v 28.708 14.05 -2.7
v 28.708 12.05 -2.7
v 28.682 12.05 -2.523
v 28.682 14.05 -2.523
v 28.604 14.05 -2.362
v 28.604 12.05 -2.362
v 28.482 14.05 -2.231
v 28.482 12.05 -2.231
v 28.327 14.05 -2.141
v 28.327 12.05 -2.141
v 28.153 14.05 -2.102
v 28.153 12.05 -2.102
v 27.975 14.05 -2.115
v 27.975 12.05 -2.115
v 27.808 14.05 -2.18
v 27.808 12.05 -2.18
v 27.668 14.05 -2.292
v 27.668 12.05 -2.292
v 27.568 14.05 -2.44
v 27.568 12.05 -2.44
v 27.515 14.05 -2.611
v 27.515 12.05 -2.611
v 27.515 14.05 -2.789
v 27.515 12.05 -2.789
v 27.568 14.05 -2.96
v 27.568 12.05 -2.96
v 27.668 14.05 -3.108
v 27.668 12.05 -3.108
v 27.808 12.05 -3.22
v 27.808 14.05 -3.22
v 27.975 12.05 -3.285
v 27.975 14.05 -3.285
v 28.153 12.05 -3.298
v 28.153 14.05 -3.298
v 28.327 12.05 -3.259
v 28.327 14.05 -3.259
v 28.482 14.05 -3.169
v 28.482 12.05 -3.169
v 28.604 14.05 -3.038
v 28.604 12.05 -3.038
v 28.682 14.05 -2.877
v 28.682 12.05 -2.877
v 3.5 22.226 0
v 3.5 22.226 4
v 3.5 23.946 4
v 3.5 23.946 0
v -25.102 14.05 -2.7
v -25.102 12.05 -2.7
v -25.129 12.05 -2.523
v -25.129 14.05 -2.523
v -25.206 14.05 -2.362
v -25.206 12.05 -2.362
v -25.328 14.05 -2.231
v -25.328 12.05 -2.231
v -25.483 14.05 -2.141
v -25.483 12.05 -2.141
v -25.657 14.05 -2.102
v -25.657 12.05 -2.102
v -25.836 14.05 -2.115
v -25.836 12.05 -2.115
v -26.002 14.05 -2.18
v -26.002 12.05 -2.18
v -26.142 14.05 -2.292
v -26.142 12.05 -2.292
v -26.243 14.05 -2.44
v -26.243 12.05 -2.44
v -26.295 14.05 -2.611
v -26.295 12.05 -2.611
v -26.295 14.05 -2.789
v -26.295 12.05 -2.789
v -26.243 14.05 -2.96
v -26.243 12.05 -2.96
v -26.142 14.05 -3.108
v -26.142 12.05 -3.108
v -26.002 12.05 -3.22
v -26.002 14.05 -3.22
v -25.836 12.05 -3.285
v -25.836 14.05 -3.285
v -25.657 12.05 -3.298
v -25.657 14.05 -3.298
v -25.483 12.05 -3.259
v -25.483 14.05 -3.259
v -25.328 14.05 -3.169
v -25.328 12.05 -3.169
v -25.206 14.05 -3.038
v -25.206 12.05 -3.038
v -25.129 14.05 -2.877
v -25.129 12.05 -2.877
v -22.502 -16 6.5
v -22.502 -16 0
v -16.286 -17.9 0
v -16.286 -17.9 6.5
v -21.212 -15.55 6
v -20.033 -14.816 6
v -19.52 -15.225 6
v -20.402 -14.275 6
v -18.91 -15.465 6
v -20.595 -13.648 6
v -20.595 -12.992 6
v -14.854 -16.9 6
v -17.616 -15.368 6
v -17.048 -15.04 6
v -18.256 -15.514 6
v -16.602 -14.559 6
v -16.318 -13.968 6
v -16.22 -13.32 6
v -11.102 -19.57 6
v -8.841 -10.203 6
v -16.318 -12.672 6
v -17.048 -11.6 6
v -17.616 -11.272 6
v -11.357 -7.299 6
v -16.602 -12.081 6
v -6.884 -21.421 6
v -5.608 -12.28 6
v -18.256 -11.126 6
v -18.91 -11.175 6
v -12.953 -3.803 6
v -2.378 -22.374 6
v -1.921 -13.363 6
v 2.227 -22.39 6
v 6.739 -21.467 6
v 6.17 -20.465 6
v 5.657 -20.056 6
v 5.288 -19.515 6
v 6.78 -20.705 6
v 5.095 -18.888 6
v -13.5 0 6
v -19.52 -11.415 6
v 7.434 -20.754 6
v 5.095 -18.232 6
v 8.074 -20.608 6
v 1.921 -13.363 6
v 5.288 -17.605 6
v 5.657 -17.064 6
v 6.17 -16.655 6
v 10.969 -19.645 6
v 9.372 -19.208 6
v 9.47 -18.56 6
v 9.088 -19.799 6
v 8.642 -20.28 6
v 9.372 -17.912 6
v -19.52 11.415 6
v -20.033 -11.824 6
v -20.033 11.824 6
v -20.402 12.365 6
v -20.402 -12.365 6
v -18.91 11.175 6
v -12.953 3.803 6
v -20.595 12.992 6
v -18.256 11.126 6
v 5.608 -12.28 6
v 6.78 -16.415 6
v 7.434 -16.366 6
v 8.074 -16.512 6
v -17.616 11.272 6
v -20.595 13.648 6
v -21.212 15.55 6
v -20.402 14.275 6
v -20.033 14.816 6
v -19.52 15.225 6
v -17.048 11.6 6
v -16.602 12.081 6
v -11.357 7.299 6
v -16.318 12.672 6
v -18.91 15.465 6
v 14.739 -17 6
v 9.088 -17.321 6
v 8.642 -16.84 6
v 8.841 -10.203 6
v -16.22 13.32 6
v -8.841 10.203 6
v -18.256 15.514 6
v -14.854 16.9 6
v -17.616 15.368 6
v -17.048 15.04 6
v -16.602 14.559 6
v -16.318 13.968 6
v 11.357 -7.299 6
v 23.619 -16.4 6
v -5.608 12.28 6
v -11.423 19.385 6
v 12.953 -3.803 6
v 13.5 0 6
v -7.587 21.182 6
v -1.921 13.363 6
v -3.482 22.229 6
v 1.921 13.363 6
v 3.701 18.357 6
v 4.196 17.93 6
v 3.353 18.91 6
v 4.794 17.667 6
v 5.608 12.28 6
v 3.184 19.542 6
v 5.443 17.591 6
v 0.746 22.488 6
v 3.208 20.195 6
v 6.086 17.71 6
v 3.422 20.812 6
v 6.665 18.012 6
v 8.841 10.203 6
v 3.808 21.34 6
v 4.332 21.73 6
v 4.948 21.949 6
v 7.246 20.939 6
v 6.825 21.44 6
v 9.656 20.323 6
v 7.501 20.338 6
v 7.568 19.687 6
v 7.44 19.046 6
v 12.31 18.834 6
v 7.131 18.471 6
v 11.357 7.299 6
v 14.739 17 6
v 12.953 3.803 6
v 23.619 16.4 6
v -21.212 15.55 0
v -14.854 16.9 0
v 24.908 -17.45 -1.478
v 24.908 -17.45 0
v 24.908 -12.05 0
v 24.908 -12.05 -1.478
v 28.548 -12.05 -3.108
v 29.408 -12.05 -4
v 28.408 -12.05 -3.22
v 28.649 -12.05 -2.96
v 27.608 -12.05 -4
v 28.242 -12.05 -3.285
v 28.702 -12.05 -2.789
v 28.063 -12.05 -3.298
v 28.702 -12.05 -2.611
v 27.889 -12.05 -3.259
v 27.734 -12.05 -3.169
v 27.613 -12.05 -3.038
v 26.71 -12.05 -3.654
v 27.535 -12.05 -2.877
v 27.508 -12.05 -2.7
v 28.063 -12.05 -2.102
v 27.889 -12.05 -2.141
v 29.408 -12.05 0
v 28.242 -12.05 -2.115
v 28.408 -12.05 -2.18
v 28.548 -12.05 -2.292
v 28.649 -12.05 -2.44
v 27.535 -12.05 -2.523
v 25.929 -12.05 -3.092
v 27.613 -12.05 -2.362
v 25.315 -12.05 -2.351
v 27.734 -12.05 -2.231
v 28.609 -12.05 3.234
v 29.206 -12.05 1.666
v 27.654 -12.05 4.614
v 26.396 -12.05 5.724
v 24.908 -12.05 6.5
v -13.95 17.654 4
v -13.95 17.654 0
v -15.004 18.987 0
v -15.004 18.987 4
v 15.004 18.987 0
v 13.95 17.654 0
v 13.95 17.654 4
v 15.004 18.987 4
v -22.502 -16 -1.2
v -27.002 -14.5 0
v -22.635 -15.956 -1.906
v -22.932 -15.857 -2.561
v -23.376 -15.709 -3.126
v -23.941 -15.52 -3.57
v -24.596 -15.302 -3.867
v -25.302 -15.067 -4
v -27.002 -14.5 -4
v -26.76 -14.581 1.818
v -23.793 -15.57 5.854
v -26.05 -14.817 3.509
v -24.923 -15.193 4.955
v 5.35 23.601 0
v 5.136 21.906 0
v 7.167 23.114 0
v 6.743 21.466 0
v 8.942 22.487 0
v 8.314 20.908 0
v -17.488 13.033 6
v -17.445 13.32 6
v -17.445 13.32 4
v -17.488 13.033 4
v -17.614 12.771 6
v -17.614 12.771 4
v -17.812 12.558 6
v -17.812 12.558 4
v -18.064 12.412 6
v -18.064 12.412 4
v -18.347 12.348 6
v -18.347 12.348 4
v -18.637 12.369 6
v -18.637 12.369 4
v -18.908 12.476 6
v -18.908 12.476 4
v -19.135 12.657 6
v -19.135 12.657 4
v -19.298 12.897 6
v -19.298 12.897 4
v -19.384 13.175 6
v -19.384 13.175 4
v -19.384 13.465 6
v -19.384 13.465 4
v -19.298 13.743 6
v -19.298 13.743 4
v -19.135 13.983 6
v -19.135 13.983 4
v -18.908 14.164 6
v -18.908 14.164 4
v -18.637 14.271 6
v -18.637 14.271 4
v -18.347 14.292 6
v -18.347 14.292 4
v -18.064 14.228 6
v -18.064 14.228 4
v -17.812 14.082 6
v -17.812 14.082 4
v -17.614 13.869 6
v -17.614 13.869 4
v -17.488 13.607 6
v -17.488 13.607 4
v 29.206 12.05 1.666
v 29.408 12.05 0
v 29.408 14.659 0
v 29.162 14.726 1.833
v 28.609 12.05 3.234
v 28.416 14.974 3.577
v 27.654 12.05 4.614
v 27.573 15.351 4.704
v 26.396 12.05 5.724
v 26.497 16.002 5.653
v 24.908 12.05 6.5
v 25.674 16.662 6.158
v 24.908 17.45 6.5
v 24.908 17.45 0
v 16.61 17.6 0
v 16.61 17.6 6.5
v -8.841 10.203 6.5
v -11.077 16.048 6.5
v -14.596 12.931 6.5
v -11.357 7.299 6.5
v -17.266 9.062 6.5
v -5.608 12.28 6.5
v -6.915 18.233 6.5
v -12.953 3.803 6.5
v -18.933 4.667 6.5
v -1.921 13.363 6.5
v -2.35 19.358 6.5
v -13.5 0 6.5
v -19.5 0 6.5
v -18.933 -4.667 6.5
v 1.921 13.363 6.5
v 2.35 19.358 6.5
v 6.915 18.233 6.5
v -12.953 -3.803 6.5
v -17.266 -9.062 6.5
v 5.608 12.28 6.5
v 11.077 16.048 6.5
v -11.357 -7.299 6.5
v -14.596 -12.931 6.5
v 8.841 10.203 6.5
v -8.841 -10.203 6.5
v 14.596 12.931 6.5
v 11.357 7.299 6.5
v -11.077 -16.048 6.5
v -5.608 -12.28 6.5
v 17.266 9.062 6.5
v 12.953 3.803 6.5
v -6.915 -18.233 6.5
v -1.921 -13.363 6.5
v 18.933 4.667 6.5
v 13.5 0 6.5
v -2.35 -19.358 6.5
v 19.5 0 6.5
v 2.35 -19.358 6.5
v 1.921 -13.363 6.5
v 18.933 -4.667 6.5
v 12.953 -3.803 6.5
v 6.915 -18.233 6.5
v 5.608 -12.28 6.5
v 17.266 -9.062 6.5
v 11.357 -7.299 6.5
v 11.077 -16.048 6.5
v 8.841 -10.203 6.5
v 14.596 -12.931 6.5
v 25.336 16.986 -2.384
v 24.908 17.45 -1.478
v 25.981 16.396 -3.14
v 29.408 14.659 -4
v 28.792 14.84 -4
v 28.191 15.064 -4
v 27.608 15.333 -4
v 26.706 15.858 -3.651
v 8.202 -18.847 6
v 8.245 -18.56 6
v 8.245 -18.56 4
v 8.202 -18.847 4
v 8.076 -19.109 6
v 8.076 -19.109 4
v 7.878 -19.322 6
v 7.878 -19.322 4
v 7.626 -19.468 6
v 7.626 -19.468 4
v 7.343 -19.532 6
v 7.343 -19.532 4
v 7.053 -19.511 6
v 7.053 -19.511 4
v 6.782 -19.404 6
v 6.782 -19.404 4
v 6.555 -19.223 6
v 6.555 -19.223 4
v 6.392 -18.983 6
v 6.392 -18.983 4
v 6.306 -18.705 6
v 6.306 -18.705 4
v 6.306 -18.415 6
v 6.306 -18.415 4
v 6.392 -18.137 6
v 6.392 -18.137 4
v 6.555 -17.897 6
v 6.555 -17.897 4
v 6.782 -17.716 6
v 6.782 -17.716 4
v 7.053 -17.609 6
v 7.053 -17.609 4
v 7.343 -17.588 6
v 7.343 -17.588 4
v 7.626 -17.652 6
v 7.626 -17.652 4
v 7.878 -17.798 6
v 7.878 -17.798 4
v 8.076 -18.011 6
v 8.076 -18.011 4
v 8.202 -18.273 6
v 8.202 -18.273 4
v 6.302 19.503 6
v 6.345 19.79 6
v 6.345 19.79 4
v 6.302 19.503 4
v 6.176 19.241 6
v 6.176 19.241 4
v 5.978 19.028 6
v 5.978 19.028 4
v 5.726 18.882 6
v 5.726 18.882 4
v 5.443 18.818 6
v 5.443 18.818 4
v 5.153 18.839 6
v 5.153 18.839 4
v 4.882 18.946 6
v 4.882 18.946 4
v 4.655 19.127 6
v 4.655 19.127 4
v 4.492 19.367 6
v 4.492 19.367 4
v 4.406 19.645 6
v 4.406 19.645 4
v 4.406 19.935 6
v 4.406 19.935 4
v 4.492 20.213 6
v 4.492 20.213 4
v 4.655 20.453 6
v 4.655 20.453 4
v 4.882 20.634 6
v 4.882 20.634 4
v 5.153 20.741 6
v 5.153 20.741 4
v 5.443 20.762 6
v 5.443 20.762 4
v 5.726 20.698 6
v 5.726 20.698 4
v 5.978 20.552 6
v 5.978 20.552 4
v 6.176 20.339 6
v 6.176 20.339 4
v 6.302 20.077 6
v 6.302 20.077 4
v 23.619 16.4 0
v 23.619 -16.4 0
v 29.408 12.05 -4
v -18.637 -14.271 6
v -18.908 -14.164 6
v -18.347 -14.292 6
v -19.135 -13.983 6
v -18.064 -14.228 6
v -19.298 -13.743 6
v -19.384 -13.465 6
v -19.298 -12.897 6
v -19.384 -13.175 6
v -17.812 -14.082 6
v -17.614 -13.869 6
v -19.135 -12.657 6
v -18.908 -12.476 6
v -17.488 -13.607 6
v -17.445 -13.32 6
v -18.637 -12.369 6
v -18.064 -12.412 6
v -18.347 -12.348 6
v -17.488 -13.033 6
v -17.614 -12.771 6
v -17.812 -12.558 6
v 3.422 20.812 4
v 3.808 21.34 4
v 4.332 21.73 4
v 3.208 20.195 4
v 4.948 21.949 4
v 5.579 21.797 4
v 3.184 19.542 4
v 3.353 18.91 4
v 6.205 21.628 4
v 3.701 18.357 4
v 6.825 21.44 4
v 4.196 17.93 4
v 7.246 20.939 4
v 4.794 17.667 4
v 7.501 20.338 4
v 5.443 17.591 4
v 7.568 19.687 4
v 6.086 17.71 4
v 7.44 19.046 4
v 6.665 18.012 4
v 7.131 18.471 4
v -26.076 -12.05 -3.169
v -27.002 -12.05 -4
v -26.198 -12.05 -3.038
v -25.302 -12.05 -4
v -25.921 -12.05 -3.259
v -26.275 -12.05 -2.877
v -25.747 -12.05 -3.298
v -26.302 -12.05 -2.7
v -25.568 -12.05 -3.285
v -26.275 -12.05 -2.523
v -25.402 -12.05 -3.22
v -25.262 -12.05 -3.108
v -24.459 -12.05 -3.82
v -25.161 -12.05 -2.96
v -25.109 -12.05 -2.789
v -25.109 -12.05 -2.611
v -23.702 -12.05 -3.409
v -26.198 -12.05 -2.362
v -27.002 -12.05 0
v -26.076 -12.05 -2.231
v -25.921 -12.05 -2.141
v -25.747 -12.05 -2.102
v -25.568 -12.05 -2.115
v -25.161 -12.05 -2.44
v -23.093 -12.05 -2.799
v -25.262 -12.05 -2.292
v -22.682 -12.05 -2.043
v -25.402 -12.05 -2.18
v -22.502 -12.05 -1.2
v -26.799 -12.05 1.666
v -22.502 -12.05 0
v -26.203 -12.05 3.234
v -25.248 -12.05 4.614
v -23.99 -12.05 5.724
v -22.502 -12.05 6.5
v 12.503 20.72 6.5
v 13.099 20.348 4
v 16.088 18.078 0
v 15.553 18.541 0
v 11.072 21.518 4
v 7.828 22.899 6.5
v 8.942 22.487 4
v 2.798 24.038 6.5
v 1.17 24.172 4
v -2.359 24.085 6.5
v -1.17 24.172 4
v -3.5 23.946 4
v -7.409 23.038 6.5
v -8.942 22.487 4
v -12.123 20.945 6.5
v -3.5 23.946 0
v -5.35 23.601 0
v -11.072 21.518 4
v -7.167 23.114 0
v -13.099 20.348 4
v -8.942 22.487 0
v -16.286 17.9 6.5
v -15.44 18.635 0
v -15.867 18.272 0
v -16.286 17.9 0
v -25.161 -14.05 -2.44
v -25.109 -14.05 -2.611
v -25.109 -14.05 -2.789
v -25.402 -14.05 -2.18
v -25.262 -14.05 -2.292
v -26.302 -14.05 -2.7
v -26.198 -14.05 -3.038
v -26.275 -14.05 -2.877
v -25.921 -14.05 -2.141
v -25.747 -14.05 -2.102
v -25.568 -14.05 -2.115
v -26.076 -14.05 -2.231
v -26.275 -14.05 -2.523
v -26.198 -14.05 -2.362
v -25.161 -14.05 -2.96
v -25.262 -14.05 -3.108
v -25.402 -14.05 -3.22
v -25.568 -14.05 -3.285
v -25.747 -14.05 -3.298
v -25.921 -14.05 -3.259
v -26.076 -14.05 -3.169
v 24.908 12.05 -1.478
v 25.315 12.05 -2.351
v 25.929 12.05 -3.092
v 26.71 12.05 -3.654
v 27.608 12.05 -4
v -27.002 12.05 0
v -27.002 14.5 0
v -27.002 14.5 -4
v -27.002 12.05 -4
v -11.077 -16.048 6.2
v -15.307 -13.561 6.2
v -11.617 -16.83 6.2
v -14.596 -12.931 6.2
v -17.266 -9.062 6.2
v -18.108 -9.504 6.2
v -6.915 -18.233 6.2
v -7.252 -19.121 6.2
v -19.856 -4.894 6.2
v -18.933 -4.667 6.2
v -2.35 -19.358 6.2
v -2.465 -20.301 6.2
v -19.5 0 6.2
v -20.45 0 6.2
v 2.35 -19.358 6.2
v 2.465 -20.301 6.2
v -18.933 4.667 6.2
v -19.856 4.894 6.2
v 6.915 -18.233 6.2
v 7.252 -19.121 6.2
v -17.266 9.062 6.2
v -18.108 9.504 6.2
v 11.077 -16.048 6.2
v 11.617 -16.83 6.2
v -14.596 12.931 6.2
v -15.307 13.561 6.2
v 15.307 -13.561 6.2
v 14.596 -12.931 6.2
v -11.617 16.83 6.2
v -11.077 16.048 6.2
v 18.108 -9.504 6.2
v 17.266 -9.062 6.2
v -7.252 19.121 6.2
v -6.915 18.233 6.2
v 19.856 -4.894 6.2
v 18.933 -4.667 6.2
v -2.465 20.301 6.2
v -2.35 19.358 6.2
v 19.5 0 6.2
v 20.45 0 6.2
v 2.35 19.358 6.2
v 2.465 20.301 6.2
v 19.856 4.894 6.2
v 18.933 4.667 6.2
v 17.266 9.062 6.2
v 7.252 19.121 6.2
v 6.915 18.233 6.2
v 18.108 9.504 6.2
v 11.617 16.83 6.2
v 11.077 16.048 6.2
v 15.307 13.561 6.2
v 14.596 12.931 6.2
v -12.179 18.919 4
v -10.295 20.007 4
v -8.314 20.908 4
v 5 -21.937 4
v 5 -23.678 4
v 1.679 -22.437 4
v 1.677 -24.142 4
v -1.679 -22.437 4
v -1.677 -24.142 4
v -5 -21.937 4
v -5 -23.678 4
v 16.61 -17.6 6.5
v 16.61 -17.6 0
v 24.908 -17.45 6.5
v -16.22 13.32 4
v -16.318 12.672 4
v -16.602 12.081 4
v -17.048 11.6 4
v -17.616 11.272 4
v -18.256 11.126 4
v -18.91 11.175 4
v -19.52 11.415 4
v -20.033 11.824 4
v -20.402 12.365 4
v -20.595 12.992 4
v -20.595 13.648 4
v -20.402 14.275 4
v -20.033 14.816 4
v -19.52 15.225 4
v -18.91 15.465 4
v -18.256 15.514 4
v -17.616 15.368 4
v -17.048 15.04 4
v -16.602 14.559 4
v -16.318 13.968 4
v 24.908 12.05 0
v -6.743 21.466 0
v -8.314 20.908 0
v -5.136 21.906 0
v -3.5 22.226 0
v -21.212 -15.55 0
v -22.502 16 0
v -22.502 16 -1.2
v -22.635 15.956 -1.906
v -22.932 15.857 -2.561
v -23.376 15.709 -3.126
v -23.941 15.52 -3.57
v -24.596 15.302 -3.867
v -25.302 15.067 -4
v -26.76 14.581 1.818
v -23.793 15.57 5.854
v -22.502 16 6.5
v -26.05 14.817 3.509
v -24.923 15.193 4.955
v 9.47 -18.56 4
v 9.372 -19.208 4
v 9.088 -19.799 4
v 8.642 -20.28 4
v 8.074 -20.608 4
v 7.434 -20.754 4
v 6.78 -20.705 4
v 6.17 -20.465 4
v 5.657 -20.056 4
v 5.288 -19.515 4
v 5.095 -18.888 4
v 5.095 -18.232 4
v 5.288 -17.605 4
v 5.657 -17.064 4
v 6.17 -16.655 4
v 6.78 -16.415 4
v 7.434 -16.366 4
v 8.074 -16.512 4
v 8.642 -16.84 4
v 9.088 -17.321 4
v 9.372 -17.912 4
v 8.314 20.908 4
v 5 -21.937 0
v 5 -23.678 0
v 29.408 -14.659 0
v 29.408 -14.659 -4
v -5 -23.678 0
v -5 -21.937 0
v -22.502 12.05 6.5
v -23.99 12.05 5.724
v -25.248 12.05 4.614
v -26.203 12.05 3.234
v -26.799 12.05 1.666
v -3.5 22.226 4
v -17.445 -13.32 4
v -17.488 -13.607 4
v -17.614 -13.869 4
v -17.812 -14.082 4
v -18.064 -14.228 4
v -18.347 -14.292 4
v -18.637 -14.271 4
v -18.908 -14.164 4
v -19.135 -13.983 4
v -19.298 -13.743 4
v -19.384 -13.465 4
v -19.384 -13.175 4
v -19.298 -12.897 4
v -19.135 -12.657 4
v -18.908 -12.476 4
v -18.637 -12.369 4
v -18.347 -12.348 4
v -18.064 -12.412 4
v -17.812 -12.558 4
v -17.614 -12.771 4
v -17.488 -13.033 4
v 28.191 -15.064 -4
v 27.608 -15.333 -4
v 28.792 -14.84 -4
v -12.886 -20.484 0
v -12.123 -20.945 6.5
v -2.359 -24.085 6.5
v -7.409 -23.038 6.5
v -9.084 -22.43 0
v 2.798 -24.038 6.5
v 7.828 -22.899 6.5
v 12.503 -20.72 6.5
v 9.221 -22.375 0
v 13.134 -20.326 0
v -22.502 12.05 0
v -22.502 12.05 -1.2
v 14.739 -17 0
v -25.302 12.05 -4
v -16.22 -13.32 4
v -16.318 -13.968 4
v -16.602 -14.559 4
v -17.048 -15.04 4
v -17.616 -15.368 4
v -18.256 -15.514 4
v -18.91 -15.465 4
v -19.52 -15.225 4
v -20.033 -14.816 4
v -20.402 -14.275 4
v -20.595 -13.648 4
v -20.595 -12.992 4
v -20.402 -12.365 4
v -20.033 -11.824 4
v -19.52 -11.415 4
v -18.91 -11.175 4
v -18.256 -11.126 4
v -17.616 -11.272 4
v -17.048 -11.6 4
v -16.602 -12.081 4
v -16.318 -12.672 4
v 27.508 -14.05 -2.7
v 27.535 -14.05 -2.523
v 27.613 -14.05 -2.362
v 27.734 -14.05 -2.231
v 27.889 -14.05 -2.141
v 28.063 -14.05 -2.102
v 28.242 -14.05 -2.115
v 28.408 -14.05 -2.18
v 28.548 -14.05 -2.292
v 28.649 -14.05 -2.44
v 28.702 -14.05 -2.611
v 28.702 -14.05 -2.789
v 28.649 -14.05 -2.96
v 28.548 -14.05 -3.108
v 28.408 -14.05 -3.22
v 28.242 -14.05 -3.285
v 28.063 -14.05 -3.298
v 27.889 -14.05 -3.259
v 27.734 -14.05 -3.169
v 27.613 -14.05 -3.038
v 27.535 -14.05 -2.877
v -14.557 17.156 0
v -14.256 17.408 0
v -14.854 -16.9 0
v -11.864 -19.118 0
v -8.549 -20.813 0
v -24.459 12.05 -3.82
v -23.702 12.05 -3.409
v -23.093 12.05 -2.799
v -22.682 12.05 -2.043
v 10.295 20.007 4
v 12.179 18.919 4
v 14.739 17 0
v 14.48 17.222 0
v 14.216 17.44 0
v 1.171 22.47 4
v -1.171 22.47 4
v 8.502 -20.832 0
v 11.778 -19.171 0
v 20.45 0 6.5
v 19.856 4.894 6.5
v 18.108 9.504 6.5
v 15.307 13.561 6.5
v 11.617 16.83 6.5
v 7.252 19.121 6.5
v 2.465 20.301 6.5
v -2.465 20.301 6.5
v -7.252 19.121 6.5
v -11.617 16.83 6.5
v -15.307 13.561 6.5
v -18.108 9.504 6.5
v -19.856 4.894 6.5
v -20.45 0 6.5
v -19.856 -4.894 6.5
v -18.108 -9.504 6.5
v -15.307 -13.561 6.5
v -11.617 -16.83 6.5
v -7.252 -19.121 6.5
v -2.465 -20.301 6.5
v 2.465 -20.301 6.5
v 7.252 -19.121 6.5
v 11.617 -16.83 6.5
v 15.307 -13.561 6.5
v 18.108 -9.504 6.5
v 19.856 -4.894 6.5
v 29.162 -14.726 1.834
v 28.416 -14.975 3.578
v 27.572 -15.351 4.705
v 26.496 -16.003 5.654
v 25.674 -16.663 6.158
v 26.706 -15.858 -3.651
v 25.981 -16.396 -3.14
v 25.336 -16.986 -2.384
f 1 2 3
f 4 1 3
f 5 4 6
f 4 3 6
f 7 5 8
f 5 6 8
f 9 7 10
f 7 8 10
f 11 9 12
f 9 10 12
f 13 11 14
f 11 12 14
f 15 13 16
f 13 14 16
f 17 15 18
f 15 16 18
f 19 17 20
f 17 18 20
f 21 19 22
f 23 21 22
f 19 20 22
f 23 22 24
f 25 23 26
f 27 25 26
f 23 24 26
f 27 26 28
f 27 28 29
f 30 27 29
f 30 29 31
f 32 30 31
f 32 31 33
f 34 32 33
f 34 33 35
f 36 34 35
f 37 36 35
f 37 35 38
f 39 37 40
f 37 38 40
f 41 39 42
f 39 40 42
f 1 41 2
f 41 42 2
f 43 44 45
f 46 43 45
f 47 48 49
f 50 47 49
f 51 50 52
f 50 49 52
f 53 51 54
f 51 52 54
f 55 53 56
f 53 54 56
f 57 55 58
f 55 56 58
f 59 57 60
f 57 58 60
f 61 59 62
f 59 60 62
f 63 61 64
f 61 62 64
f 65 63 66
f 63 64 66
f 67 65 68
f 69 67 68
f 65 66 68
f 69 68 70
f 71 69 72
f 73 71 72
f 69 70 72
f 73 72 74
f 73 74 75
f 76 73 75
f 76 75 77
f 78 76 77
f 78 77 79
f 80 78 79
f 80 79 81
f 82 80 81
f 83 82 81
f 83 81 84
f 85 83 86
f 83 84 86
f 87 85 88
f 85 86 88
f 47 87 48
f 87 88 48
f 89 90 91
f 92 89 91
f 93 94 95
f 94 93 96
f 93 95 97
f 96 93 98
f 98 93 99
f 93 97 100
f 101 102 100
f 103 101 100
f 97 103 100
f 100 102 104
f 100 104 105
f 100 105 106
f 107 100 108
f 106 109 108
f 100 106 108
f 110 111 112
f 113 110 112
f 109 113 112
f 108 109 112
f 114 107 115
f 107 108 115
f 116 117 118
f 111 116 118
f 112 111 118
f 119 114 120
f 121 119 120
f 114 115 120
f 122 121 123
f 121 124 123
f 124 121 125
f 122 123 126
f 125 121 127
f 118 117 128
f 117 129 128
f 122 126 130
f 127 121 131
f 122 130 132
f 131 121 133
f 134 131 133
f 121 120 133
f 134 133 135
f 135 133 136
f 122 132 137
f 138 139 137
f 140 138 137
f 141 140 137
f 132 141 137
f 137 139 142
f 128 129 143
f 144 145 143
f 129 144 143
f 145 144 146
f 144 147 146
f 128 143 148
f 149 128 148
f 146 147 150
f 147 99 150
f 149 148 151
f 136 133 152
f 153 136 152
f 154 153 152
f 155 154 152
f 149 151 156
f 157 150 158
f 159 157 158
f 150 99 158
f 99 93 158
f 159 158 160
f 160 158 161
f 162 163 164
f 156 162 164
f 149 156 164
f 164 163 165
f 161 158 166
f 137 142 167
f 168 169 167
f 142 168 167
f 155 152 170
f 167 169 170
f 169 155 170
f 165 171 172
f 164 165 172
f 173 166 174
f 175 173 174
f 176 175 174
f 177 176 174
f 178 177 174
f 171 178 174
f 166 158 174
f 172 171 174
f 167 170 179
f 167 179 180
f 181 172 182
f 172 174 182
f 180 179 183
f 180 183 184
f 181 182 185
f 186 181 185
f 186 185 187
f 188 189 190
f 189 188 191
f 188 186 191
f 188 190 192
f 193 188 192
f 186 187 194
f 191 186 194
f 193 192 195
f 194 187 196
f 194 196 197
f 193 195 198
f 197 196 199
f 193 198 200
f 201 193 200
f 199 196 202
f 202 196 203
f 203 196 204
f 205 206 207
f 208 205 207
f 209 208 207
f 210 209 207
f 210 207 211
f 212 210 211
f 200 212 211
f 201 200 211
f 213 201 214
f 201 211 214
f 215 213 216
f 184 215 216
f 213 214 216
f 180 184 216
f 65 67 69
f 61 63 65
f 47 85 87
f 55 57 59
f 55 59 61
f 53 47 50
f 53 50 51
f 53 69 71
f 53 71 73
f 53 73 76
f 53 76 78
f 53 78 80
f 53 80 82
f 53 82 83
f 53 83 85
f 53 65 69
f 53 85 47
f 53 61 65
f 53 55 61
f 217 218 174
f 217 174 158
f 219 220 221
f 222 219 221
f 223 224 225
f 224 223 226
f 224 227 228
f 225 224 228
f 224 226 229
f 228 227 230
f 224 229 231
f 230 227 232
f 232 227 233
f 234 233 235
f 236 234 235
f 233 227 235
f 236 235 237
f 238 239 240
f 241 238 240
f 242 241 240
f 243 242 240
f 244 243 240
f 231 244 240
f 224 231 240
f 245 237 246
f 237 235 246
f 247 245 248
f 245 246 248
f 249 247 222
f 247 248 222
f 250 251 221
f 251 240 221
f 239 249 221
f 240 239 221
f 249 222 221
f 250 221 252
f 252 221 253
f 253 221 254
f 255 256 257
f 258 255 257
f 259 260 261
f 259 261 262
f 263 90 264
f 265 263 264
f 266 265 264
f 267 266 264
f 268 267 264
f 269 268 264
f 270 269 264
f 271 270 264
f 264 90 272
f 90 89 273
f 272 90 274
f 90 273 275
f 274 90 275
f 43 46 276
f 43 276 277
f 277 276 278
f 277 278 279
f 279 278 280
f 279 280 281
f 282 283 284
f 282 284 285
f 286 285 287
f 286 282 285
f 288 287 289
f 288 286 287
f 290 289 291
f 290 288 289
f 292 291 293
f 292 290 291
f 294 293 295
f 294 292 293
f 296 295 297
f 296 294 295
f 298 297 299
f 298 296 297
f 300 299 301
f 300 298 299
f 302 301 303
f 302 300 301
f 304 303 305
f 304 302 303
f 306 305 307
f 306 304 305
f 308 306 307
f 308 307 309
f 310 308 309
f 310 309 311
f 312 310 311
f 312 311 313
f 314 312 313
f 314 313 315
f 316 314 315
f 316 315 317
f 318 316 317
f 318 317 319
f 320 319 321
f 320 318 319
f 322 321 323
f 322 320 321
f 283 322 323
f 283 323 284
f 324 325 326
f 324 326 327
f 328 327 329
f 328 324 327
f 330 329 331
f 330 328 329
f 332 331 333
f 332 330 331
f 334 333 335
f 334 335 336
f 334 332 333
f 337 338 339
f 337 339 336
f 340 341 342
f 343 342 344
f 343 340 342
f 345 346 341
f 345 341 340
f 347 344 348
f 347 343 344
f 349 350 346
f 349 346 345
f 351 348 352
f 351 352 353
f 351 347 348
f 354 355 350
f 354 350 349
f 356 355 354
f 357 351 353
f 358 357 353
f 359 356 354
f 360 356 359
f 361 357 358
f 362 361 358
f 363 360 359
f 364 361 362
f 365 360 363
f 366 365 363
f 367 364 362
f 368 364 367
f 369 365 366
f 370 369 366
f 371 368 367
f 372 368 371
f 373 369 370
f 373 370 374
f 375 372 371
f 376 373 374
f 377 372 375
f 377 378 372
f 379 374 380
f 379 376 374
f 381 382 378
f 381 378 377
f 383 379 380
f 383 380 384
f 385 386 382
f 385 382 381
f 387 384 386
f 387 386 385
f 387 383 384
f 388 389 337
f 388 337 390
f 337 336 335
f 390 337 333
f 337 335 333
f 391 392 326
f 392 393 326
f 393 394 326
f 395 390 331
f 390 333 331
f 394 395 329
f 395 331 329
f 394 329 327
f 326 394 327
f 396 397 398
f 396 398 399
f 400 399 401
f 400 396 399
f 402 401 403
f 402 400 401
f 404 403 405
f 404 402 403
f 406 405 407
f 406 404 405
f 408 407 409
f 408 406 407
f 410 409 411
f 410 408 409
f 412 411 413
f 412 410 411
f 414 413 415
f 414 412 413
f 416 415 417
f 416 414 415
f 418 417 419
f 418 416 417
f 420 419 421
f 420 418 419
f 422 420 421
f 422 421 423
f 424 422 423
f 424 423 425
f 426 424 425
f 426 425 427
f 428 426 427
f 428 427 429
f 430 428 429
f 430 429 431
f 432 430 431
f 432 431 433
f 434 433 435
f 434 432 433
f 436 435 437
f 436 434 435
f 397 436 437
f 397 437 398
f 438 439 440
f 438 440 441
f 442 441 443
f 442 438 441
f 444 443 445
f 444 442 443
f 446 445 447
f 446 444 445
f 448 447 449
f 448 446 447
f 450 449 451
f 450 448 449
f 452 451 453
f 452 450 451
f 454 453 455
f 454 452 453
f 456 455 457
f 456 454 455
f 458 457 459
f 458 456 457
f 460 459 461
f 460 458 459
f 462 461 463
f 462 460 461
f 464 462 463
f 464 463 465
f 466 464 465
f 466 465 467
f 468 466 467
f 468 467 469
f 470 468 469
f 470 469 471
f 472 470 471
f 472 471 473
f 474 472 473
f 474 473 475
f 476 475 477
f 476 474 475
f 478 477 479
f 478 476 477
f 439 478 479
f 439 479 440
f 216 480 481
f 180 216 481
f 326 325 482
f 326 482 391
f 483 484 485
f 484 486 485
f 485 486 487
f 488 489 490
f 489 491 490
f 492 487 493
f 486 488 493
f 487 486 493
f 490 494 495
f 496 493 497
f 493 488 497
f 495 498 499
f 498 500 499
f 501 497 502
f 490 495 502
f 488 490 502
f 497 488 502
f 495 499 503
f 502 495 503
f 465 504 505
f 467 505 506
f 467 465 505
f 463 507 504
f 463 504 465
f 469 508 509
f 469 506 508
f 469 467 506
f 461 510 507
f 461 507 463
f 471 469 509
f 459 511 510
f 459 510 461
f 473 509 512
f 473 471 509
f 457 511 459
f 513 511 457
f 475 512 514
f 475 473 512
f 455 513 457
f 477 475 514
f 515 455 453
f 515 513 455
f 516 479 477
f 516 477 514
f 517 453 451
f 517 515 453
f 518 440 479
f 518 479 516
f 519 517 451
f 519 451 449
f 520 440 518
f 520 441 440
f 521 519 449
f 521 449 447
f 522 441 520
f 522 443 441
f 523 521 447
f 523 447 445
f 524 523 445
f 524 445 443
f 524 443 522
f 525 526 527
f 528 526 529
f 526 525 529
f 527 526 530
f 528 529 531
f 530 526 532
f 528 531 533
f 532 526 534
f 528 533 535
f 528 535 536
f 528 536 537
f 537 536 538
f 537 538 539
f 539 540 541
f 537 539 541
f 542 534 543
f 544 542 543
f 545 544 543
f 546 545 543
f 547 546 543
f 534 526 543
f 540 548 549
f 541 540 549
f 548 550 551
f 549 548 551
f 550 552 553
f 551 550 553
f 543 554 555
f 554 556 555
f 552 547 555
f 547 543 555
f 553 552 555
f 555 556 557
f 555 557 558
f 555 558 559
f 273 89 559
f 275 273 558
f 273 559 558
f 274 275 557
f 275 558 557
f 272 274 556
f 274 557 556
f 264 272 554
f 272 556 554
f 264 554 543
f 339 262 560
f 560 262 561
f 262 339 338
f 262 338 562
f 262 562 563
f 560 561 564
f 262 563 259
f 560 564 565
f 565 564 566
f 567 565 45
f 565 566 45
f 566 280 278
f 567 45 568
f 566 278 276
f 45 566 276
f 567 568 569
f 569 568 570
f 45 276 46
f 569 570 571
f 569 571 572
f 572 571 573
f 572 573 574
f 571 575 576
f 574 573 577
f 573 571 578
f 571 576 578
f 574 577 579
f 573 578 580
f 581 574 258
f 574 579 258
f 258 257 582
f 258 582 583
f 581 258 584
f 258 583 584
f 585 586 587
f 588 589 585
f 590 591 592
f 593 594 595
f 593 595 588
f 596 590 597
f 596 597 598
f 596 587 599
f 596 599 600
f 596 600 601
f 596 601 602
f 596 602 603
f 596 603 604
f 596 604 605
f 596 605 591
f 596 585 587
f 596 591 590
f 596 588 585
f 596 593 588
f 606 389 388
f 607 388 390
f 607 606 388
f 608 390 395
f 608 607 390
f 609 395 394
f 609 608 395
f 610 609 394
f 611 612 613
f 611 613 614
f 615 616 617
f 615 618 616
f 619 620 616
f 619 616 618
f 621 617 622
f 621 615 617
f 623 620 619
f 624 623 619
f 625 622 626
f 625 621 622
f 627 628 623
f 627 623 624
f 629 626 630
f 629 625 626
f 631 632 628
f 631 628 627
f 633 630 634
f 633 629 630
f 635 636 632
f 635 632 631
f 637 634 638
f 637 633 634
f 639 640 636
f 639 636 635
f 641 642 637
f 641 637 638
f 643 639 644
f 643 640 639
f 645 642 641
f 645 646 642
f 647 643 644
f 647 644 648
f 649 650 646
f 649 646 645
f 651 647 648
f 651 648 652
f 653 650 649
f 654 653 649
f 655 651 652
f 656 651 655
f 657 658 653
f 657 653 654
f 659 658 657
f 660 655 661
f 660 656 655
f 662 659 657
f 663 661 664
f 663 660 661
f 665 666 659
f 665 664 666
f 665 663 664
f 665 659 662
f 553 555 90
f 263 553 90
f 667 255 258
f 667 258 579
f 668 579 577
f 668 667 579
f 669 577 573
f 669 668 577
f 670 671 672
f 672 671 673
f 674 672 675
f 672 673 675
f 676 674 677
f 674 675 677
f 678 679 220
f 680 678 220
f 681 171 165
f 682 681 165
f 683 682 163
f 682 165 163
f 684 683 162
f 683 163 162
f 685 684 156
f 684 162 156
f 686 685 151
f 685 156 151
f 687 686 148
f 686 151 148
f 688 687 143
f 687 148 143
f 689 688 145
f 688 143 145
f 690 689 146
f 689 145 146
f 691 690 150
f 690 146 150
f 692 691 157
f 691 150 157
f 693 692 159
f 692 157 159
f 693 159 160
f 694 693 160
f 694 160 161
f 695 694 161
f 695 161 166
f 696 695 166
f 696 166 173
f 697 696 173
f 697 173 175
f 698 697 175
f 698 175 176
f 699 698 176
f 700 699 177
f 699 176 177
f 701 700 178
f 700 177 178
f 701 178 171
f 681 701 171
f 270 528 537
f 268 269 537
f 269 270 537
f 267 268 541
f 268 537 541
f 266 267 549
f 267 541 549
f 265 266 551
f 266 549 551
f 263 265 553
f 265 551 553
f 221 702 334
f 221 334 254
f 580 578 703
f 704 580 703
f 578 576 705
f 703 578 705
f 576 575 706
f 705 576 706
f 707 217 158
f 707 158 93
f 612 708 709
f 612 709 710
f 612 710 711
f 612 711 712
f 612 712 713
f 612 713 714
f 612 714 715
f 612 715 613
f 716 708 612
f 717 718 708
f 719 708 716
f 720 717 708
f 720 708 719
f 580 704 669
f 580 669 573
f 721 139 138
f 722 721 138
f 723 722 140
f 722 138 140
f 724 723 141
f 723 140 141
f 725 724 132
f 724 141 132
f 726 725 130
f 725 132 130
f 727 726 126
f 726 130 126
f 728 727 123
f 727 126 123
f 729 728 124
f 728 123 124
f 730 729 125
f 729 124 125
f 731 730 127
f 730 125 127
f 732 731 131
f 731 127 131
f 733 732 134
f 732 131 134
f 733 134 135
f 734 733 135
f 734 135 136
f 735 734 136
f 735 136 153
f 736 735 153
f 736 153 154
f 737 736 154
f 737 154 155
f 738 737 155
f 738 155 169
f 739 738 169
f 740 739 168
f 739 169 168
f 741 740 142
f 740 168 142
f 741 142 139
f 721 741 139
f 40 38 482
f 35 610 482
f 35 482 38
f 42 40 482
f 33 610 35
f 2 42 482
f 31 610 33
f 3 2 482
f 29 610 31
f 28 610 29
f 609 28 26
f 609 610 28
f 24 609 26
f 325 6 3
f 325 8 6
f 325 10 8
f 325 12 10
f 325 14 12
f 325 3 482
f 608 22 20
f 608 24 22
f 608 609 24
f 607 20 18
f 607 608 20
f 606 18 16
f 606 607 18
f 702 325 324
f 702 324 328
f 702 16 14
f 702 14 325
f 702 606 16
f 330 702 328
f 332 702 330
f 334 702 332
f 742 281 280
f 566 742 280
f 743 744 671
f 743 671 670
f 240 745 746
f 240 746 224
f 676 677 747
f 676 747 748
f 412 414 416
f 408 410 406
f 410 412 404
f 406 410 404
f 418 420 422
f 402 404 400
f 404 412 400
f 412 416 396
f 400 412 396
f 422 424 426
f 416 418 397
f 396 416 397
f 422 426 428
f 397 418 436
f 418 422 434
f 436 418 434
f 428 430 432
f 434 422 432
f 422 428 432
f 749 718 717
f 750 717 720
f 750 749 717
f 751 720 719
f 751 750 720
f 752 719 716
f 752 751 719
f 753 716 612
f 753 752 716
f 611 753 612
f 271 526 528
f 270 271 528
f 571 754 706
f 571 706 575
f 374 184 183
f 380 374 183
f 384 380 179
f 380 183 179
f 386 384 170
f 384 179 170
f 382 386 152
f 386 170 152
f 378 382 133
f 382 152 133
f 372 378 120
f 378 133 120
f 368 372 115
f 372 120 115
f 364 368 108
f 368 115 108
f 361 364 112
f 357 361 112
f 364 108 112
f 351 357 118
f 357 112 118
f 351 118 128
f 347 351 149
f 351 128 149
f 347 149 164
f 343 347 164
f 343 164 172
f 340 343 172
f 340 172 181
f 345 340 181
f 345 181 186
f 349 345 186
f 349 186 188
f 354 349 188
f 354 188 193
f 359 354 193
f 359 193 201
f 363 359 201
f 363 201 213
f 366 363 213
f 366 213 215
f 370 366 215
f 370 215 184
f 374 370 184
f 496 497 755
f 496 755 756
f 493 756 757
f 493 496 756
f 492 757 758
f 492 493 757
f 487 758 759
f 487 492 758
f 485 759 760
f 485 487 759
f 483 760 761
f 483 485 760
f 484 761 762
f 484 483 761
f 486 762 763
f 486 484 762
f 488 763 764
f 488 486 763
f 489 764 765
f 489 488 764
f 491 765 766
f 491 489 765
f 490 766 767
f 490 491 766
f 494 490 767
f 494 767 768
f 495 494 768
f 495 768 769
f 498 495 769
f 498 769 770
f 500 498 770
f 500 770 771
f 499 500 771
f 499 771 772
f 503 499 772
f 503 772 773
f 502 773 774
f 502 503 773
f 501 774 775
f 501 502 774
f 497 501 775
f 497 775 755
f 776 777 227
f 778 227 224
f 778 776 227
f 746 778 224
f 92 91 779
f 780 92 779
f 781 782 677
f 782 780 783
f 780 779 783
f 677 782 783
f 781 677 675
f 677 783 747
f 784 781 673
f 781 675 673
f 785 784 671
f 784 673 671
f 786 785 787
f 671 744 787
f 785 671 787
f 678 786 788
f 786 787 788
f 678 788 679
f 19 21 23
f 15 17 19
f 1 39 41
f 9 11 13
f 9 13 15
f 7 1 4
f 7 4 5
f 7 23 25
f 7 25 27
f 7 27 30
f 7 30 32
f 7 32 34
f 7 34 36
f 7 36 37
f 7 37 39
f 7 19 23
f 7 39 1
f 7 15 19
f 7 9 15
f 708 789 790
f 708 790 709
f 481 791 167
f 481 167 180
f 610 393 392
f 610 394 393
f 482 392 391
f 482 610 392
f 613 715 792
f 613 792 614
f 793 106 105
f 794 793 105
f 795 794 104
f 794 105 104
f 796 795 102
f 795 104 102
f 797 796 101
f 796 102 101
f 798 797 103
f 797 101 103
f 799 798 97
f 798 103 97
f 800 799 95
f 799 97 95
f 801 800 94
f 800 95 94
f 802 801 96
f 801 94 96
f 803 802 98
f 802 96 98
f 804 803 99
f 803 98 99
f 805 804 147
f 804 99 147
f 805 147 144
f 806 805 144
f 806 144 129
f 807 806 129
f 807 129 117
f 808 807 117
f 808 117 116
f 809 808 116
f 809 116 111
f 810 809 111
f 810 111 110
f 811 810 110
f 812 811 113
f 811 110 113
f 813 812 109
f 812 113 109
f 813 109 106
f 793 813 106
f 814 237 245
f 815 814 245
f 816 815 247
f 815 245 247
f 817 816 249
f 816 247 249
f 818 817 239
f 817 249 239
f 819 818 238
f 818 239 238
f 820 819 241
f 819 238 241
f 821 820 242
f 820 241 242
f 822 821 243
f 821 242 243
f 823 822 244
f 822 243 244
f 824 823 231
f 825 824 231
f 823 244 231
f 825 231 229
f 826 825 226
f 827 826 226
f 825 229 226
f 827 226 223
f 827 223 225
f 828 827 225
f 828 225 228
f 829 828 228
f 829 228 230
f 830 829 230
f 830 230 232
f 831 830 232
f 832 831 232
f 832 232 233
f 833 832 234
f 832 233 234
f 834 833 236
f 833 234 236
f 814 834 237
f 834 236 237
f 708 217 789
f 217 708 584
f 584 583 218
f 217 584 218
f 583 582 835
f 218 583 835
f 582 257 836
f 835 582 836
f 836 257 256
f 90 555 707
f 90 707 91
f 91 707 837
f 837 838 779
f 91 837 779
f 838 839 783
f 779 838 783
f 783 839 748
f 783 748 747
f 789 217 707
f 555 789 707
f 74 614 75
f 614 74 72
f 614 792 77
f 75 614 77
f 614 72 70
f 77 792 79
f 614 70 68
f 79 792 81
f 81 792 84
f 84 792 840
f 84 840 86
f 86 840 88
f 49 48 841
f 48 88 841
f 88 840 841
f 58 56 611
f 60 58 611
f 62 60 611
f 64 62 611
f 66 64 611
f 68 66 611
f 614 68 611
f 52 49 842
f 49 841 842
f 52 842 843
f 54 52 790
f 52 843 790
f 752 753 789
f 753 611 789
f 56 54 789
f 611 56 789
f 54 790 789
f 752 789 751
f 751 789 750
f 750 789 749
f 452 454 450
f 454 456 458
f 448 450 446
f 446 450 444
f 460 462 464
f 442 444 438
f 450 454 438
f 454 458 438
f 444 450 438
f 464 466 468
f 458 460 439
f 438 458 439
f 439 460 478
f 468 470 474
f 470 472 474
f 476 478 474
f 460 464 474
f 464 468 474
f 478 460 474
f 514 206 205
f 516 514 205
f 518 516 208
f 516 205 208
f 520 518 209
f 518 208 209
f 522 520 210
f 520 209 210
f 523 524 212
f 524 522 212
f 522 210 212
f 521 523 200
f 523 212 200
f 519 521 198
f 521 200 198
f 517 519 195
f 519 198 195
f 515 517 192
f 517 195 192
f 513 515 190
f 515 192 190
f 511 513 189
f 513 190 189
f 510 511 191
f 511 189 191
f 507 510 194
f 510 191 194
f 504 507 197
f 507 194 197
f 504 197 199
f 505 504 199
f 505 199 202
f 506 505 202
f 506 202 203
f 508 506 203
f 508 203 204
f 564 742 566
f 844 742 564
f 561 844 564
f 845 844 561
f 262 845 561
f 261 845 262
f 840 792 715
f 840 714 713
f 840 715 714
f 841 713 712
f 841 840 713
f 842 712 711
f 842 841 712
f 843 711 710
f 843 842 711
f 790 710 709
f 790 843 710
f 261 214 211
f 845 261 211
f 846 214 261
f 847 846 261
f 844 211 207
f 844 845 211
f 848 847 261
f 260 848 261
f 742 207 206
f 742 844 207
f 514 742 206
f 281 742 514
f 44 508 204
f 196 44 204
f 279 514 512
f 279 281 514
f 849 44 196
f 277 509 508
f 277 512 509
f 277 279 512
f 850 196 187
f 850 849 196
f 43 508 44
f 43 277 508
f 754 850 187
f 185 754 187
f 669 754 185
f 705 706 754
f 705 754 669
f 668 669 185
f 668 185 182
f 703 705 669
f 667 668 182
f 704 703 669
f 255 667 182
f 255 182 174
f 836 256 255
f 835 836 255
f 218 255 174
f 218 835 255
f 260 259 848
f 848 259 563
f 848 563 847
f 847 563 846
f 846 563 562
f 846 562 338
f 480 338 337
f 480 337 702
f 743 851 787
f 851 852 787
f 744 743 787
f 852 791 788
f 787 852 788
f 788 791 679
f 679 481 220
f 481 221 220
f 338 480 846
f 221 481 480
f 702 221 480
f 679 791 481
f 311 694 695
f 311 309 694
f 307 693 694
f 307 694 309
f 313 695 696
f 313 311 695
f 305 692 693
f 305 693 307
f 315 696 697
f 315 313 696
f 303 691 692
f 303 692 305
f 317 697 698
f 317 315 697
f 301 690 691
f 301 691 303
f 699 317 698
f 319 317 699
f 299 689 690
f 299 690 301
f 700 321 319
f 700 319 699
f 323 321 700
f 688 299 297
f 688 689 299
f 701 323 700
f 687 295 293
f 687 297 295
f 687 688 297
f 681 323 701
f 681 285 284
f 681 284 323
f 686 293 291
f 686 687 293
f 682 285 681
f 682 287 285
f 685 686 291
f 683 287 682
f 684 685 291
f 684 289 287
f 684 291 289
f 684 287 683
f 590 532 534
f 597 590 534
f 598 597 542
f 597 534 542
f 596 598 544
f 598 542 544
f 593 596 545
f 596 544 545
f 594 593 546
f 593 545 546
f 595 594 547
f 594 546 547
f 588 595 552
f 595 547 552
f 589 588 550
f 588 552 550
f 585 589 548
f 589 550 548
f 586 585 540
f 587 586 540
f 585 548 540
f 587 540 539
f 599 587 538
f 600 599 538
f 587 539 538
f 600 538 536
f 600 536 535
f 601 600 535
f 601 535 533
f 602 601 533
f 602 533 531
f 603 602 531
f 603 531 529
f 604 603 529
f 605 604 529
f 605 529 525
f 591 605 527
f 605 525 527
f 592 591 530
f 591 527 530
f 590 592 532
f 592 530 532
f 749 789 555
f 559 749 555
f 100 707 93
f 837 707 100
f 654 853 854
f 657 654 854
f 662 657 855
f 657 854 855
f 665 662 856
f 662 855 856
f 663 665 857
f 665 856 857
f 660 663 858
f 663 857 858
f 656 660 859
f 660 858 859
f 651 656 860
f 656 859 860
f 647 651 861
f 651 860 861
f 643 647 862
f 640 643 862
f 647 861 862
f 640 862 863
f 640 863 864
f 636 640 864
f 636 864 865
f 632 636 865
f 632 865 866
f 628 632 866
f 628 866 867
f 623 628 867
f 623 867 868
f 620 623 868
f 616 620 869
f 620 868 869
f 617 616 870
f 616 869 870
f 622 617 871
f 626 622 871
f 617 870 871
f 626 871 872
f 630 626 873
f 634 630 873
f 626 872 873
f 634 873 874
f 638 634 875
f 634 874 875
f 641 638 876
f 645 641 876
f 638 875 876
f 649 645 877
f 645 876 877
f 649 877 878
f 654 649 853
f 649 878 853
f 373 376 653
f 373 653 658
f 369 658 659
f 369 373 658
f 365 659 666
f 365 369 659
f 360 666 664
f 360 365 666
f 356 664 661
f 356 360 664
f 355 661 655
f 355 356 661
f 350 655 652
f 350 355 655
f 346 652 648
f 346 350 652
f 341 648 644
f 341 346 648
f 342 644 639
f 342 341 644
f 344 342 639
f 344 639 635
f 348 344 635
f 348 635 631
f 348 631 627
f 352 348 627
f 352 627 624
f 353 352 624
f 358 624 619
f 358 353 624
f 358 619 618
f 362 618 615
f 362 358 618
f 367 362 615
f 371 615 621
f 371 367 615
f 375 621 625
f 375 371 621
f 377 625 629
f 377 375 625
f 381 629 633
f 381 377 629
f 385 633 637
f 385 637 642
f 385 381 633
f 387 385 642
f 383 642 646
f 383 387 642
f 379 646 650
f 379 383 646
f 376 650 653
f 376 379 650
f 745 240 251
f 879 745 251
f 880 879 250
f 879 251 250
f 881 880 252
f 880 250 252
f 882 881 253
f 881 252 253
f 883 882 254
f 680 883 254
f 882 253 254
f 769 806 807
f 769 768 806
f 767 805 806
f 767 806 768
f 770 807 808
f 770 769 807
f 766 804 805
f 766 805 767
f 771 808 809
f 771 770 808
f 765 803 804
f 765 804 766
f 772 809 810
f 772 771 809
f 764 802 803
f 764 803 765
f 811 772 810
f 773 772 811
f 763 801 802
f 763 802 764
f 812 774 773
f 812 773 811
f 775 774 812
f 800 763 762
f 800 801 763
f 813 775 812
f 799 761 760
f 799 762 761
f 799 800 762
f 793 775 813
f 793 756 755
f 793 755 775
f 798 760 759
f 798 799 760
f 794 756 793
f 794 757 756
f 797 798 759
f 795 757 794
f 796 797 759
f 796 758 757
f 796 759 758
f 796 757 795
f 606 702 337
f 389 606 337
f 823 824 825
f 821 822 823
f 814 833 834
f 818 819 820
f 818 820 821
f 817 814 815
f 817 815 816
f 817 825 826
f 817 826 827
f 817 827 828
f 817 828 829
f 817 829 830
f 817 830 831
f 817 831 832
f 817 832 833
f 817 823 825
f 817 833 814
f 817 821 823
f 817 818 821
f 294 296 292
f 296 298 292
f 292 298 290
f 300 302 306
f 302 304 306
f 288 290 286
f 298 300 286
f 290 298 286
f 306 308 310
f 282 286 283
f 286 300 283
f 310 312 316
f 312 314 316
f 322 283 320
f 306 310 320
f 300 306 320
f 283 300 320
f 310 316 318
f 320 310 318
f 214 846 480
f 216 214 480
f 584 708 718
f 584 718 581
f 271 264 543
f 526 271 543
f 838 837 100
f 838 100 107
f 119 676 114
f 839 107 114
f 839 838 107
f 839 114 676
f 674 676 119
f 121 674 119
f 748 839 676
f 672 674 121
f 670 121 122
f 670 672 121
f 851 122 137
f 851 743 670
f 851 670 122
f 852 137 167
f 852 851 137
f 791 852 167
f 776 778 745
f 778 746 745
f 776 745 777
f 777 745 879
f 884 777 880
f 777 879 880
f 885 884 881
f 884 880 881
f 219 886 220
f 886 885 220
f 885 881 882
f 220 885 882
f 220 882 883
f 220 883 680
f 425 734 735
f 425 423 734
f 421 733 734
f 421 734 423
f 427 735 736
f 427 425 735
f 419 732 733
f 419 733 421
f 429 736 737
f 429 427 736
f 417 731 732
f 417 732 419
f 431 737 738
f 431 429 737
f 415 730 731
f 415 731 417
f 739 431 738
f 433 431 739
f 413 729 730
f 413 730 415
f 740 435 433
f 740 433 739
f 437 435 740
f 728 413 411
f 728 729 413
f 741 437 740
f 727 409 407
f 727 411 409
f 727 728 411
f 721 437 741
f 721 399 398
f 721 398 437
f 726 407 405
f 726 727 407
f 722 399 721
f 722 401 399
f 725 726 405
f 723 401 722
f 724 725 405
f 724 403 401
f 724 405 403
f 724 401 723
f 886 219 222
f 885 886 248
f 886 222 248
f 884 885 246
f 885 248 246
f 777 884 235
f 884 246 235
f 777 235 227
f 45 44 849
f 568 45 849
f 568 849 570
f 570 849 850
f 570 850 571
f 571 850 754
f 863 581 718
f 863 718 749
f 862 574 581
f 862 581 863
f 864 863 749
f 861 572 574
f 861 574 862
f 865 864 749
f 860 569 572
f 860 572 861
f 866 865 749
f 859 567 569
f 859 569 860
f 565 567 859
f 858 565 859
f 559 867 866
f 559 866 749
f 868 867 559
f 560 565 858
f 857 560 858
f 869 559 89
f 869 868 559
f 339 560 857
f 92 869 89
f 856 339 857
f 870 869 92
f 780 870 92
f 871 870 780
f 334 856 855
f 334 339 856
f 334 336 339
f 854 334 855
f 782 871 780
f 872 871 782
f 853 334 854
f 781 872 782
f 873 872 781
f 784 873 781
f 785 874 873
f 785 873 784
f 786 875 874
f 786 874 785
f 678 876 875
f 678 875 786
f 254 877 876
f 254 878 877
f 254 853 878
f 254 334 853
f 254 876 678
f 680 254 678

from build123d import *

# Parameters (mm, degrees)
PAD_DEPTH            = 6.5
POCKET_DEPTH         = 6
SKETCH002_R          = 13.5
POCKET001_DEPTH      = 1
SKETCH003_W          = 5.4
SKETCH003_H          = 6.5
PAD001_DEPTH         = 4.5
POCKET002_DEPTH      = 10
SKETCH010_W          = 3.95
SKETCH010_H          = 6.5
PAD002_DEPTH         = 4.5
POCKET005_DEPTH      = 10
SKETCH014_R          = 20.45
SKETCH014_R_2        = 19.5
POCKET008_DEPTH      = 0.3
SKETCH015_R          = 2.2
SKETCH015_R_2        = 0.975
PAD003_DEPTH         = 2
POCKET009_DEPTH      = 4
POCKET010_DEPTH      = 4
PAD004_DEPTH         = 4
SKETCH019_R          = 0.6
POCKET011_DEPTH      = 2
SKETCH020_R          = 0.6
POCKET012_DEPTH      = 2
POCKET013_DEPTH      = 12.151
POCKET013_DEPTH_BACK = 36.251


with BuildPart() as part:
    # Sketch → Pad (new body)
    with BuildSketch(Plane.XY):
        with BuildLine():
            Line((-22.5019915649, 16), (-22.5019915649, -16))
            Line((-22.5019915649, -16), (-16.2858834577, -17.9000000001))
            ThreePointArc((-16.2858834577, -17.9000000001), (0.2206895737, -24.1989937004), (16.6096357576, -17.5999999999))
            Line((16.6096357576, -17.5999999999), (24.9082802252, -17.45))
            Line((24.9082802252, 17.45), (24.9082802252, -17.45))
            Line((16.6096357576, 17.6), (24.9082802252, 17.45))
            ThreePointArc((16.6096357576, 17.6), (0.2206895736, 24.1989937004), (-16.2858834578, 17.9))
            Line((-22.5019915649, 16), (-16.2858834578, 17.9))
        make_face()
    extrude(amount=PAD_DEPTH)

    # Sketch001 → Pocket (cut)
    with BuildSketch(Plane.XY):
        with BuildLine():
            Line((-14.8539557021, 16.9), (-21.2122180433, 15.55))
            Line((-21.2122180433, 15.55), (-21.2122180433, -15.55))
            Line((-21.2122180433, -15.55), (-14.8539557021, -16.9))
            ThreePointArc((-14.8539557021, -16.9), (-0.0760301383, -22.4998715423), (14.739402973, -17))
            Line((14.739402973, -17), (23.6191552218, -16.4))
            Line((23.6191552218, 16.4), (23.6191552218, -16.4))
            Line((14.739402973, 17), (23.6191552218, 16.4))
            ThreePointArc((14.739402973, 17), (-0.0760301383, 22.4998715423), (-14.8539557021, 16.9))
        make_face()
    extrude(amount=POCKET_DEPTH, mode=Mode.SUBTRACT)

    # Sketch002 (on Face19 of Pocket) → Pocket001 (cut)
    with BuildSketch(Plane(origin=(0, 0, 6), x_dir=(1, 0, 0), z_dir=(0, 0, -1))):
        Circle(SKETCH002_R)
    extrude(amount=-POCKET001_DEPTH, mode=Mode.SUBTRACT)

    # Sketch003 (on Face7 of Pad) → Pad001 (join)
    with BuildSketch(Plane.YZ.offset(24.9082802252)):
        with Locations((-14.75, 3.25)):
            Rectangle(SKETCH003_W, SKETCH003_H)
        with Locations((14.75, 3.25)):
            Rectangle(SKETCH003_W, SKETCH003_H)
    extrude(amount=PAD001_DEPTH)

    # Sketch006 (on Face22 of Pad001) → Pocket002 (cut)
    with BuildSketch(Plane.XY.offset(6.5)):
        with BuildLine():
            ThreePointArc((24.9082802252, 17.45), (26.9423471239, 15.7065020586), (29.4082802252, 14.6594169811))
            Line((29.4082802252, 17.45), (29.4082802252, 14.6594169811))
            Line((29.4082802252, 17.45), (24.9082802252, 17.45))
        make_face()
        with BuildLine():
            ThreePointArc((29.4082802252, -14.6594169811), (26.9423471239, -15.7065020586), (24.9082802252, -17.45))
            Line((29.4082802252, -17.45), (24.9082802252, -17.45))
            Line((29.4082802252, -14.6594169811), (29.4082802252, -17.45))
        make_face()
    extrude(amount=-POCKET002_DEPTH, mode=Mode.SUBTRACT)

    # Sketch010 (on Face3 of Pad) → Pad002 (join)
    with BuildSketch(Plane(origin=(-22.5019915649, 0, 0), x_dir=(0, -1, 0), z_dir=(-1, 0, 0))):
        with Locations((-14.025, 3.25)):
            Rectangle(SKETCH010_W, SKETCH010_H)
        with Locations((14.025, 3.25)):
            Rectangle(SKETCH010_W, SKETCH010_H)
    extrude(amount=PAD002_DEPTH)

    # Sketch011 (on Face28 of Pad002) → Pocket005 (cut)
    with BuildSketch(Plane.XY.offset(6.5)):
        Polygon((-27.0019915649, 16), (-22.5019915649, 16), (-27.0019915649, 14.5), align=None)
        Polygon((-22.5019915649, -16), (-27.0019915649, -14.5), (-27.0019915649, -16), align=None)
    extrude(amount=-POCKET005_DEPTH, mode=Mode.SUBTRACT)

    # Sketch014 (on Face10 of Pad) → Pocket008 (cut)
    with BuildSketch(Plane.XY.offset(6.5)):
        Circle(SKETCH014_R)
        Circle(SKETCH014_R_2, mode=Mode.SUBTRACT)
    extrude(amount=-POCKET008_DEPTH, mode=Mode.SUBTRACT)

    # Sketch015 (on Face19 of Pocket) → Pad003 (join)
    with BuildSketch(Plane(origin=(0, 0, 6), x_dir=(1, 0, 0), z_dir=(0, 0, -1))):
        with Locations((-18.42, 13.32)):
            Circle(SKETCH015_R)
        with Locations((-18.42, 13.32)):
            Circle(SKETCH015_R_2, mode=Mode.SUBTRACT)
        with Locations((7.27, 18.56)):
            Circle(SKETCH015_R)
        with Locations((7.27, 18.56)):
            Circle(SKETCH015_R_2, mode=Mode.SUBTRACT)
        with Locations((5.37, -19.79)):
            Circle(SKETCH015_R)
        with Locations((5.37, -19.79)):
            Circle(SKETCH015_R_2, mode=Mode.SUBTRACT)
        with Locations((-18.42, -13.32)):
            Circle(SKETCH015_R)
        with Locations((-18.42, -13.32)):
            Circle(SKETCH015_R_2, mode=Mode.SUBTRACT)
    extrude(amount=PAD003_DEPTH)

    # Sketch016 → Pocket009 (cut)
    with BuildSketch(Plane(origin=(0, 0, 0), x_dir=(-1, 0, 0), z_dir=(0, 0, 1))):
        with BuildLine():
            Line((-5, 23.6778377391), (-5, 21.9374109685))
            ThreePointArc((5, 21.9374109685), (0, 22.5), (-5, 21.9374109685))
            Line((5, 23.6778377391), (5, 21.9374109685))
            ThreePointArc((5, 23.6778377391), (0, 24.2), (-5, 23.6778377391))
        make_face()
    extrude(amount=POCKET009_DEPTH, mode=Mode.SUBTRACT)

    # Sketch017 → Pocket010 (cut)
    with BuildSketch(Plane(origin=(0, 0, 0), x_dir=(-1, 0, 0), z_dir=(0, 0, 1))):
        with BuildLine():
            Line((-3.499984119, -22.2261132717), (-3.5, -23.9455632634))
            ThreePointArc((-3.5, -23.9455632634), (0, -24.2000019575), (3.5, -23.9455632634))
            Line((3.5000158811, -22.2261082701), (3.5, -23.9455632634))
            ThreePointArc((-3.499984119, -22.2261132717), (1.60767e-05, -22.5), (3.5000158811, -22.2261082701))
        make_face()
        with BuildLine():
            ThreePointArc((-13.9498796389, -17.6536358312), (-11.25, -19.4855715851), (-8.3135572795, -20.9077680626))
            Line((-8.3135572795, -20.9077680626), (-8.9416927184, -22.487466094))
            ThreePointArc((-15.0038705449, -18.987466094), (-12.1, -20.9578147716), (-8.9416927184, -22.487466094))
            Line((-13.9498796389, -17.6536358312), (-15.0038705449, -18.987466094))
        make_face()
        with BuildLine():
            ThreePointArc((8.3135572795, -20.9077680626), (11.25, -19.4855715851), (13.9498796389, -17.6536358312))
            Line((13.9498796389, -17.6536358312), (15.0038705449, -18.987466094))
            ThreePointArc((8.9416927184, -22.487466094), (12.1, -20.9578147716), (15.0038705449, -18.987466094))
            Line((8.3135572795, -20.9077680626), (8.9416927184, -22.487466094))
        make_face()
    extrude(amount=POCKET010_DEPTH, mode=Mode.SUBTRACT)

    # Sketch018 (on Face8 of Pocket005) → Pad004 (join)
    with BuildSketch(Plane(origin=(0, 0, 0), x_dir=(1, 0, 0), z_dir=(0, 0, -1))):
        Polygon((-27.0019915649, 14.5), (-27.0019915649, 12.05), (-22.5019915649, 12.05), (-22.5019915649, 16), align=None)
        Polygon((-27.0019915649, -12.05), (-22.5019915649, -12.05), (-22.5019915649, -16), (-27.0019915649, -14.5), align=None)
        with BuildLine():
            Line((24.9082802252, 17.45), (24.9082802252, 12.05))
            Line((29.4082802252, 12.05), (24.9082802252, 12.05))
            Line((29.4082802252, 14.6594169811), (29.4082802252, 12.05))
            ThreePointArc((24.9082802252, 17.45), (26.9423471239, 15.7065020586), (29.4082802252, 14.6594169811))
        make_face()
        with BuildLine():
            Line((24.9082802252, -12.05), (24.9082802252, -17.45))
            ThreePointArc((29.4082802252, -14.6594169811), (26.9423471239, -15.7065020586), (24.9082802252, -17.45))
            Line((29.4082802252, -12.05), (29.4082802252, -14.6594169811))
            Line((24.9082802252, -12.05), (29.4082802252, -12.05))
        make_face()
    extrude(amount=PAD004_DEPTH)

    # Sketch019 (on Face64 of Pad004) → Pocket011 (cut)
    with BuildSketch(Plane.XZ.offset(-12.05)):
        with Locations((28.1082802252, -2.7)):
            Circle(SKETCH019_R)
        with Locations((-25.7019915649, -2.7)):
            Circle(SKETCH019_R)
    extrude(amount=-POCKET011_DEPTH, mode=Mode.SUBTRACT)

    # Sketch020 (on Face50 of Pocket011) → Pocket012 (cut)
    with BuildSketch(Plane(origin=(0, -12.05, 0), x_dir=(-1, 0, 0), z_dir=(0, 1, 0))):
        with Locations((-28.1082802252, -2.7)):
            Circle(SKETCH020_R)
        with Locations((25.7019915649, -2.7)):
            Circle(SKETCH020_R)
    extrude(amount=-POCKET012_DEPTH, mode=Mode.SUBTRACT)

    # Sketch021 (on Face48 of Pocket012) → Pocket013 (cut, two sides)
    with BuildSketch(Plane.XZ.offset(-12.05)) as pocket013_sk:
        with BuildLine():
            ThreePointArc((29.4082802252, 0), (28.1735037783, 3.9528470752), (24.9082802252, 6.5))
            Line((24.9082802252, 6.5), (29.4082802252, 6.5))
            Line((29.4082802252, 6.5), (29.4082802252, 0))
        make_face()
        with BuildLine():
            ThreePointArc((24.9082802252, -1.478433716), (25.9291187082, -3.0916708473), (27.6082802252, -4))
            Line((24.9082802252, -4), (27.6082802252, -4))
            Line((24.9082802252, -1.478433716), (24.9082802252, -4))
        make_face()
        with BuildLine():
            ThreePointArc((-22.5019915649, 6.5), (-25.767215118, 3.9528470752), (-27.0019915649, 0))
            Line((-27.0019915649, 6.5), (-27.0019915649, 0))
            Line((-22.5019915649, 6.5), (-27.0019915649, 6.5))
        make_face()
        with BuildLine():
            ThreePointArc((-25.3019915649, -4), (-23.3759624024, -3.1260291625), (-22.5019915649, -1.2))
            Line((-22.5019915649, -1.2), (-22.5019915649, -4))
            Line((-22.5019915649, -4), (-25.3019915649, -4))
        make_face()
    extrude(amount=-POCKET013_DEPTH, mode=Mode.SUBTRACT)
    extrude(pocket013_sk.sketch, amount=POCKET013_DEPTH_BACK, mode=Mode.SUBTRACT)


solid = part.part
